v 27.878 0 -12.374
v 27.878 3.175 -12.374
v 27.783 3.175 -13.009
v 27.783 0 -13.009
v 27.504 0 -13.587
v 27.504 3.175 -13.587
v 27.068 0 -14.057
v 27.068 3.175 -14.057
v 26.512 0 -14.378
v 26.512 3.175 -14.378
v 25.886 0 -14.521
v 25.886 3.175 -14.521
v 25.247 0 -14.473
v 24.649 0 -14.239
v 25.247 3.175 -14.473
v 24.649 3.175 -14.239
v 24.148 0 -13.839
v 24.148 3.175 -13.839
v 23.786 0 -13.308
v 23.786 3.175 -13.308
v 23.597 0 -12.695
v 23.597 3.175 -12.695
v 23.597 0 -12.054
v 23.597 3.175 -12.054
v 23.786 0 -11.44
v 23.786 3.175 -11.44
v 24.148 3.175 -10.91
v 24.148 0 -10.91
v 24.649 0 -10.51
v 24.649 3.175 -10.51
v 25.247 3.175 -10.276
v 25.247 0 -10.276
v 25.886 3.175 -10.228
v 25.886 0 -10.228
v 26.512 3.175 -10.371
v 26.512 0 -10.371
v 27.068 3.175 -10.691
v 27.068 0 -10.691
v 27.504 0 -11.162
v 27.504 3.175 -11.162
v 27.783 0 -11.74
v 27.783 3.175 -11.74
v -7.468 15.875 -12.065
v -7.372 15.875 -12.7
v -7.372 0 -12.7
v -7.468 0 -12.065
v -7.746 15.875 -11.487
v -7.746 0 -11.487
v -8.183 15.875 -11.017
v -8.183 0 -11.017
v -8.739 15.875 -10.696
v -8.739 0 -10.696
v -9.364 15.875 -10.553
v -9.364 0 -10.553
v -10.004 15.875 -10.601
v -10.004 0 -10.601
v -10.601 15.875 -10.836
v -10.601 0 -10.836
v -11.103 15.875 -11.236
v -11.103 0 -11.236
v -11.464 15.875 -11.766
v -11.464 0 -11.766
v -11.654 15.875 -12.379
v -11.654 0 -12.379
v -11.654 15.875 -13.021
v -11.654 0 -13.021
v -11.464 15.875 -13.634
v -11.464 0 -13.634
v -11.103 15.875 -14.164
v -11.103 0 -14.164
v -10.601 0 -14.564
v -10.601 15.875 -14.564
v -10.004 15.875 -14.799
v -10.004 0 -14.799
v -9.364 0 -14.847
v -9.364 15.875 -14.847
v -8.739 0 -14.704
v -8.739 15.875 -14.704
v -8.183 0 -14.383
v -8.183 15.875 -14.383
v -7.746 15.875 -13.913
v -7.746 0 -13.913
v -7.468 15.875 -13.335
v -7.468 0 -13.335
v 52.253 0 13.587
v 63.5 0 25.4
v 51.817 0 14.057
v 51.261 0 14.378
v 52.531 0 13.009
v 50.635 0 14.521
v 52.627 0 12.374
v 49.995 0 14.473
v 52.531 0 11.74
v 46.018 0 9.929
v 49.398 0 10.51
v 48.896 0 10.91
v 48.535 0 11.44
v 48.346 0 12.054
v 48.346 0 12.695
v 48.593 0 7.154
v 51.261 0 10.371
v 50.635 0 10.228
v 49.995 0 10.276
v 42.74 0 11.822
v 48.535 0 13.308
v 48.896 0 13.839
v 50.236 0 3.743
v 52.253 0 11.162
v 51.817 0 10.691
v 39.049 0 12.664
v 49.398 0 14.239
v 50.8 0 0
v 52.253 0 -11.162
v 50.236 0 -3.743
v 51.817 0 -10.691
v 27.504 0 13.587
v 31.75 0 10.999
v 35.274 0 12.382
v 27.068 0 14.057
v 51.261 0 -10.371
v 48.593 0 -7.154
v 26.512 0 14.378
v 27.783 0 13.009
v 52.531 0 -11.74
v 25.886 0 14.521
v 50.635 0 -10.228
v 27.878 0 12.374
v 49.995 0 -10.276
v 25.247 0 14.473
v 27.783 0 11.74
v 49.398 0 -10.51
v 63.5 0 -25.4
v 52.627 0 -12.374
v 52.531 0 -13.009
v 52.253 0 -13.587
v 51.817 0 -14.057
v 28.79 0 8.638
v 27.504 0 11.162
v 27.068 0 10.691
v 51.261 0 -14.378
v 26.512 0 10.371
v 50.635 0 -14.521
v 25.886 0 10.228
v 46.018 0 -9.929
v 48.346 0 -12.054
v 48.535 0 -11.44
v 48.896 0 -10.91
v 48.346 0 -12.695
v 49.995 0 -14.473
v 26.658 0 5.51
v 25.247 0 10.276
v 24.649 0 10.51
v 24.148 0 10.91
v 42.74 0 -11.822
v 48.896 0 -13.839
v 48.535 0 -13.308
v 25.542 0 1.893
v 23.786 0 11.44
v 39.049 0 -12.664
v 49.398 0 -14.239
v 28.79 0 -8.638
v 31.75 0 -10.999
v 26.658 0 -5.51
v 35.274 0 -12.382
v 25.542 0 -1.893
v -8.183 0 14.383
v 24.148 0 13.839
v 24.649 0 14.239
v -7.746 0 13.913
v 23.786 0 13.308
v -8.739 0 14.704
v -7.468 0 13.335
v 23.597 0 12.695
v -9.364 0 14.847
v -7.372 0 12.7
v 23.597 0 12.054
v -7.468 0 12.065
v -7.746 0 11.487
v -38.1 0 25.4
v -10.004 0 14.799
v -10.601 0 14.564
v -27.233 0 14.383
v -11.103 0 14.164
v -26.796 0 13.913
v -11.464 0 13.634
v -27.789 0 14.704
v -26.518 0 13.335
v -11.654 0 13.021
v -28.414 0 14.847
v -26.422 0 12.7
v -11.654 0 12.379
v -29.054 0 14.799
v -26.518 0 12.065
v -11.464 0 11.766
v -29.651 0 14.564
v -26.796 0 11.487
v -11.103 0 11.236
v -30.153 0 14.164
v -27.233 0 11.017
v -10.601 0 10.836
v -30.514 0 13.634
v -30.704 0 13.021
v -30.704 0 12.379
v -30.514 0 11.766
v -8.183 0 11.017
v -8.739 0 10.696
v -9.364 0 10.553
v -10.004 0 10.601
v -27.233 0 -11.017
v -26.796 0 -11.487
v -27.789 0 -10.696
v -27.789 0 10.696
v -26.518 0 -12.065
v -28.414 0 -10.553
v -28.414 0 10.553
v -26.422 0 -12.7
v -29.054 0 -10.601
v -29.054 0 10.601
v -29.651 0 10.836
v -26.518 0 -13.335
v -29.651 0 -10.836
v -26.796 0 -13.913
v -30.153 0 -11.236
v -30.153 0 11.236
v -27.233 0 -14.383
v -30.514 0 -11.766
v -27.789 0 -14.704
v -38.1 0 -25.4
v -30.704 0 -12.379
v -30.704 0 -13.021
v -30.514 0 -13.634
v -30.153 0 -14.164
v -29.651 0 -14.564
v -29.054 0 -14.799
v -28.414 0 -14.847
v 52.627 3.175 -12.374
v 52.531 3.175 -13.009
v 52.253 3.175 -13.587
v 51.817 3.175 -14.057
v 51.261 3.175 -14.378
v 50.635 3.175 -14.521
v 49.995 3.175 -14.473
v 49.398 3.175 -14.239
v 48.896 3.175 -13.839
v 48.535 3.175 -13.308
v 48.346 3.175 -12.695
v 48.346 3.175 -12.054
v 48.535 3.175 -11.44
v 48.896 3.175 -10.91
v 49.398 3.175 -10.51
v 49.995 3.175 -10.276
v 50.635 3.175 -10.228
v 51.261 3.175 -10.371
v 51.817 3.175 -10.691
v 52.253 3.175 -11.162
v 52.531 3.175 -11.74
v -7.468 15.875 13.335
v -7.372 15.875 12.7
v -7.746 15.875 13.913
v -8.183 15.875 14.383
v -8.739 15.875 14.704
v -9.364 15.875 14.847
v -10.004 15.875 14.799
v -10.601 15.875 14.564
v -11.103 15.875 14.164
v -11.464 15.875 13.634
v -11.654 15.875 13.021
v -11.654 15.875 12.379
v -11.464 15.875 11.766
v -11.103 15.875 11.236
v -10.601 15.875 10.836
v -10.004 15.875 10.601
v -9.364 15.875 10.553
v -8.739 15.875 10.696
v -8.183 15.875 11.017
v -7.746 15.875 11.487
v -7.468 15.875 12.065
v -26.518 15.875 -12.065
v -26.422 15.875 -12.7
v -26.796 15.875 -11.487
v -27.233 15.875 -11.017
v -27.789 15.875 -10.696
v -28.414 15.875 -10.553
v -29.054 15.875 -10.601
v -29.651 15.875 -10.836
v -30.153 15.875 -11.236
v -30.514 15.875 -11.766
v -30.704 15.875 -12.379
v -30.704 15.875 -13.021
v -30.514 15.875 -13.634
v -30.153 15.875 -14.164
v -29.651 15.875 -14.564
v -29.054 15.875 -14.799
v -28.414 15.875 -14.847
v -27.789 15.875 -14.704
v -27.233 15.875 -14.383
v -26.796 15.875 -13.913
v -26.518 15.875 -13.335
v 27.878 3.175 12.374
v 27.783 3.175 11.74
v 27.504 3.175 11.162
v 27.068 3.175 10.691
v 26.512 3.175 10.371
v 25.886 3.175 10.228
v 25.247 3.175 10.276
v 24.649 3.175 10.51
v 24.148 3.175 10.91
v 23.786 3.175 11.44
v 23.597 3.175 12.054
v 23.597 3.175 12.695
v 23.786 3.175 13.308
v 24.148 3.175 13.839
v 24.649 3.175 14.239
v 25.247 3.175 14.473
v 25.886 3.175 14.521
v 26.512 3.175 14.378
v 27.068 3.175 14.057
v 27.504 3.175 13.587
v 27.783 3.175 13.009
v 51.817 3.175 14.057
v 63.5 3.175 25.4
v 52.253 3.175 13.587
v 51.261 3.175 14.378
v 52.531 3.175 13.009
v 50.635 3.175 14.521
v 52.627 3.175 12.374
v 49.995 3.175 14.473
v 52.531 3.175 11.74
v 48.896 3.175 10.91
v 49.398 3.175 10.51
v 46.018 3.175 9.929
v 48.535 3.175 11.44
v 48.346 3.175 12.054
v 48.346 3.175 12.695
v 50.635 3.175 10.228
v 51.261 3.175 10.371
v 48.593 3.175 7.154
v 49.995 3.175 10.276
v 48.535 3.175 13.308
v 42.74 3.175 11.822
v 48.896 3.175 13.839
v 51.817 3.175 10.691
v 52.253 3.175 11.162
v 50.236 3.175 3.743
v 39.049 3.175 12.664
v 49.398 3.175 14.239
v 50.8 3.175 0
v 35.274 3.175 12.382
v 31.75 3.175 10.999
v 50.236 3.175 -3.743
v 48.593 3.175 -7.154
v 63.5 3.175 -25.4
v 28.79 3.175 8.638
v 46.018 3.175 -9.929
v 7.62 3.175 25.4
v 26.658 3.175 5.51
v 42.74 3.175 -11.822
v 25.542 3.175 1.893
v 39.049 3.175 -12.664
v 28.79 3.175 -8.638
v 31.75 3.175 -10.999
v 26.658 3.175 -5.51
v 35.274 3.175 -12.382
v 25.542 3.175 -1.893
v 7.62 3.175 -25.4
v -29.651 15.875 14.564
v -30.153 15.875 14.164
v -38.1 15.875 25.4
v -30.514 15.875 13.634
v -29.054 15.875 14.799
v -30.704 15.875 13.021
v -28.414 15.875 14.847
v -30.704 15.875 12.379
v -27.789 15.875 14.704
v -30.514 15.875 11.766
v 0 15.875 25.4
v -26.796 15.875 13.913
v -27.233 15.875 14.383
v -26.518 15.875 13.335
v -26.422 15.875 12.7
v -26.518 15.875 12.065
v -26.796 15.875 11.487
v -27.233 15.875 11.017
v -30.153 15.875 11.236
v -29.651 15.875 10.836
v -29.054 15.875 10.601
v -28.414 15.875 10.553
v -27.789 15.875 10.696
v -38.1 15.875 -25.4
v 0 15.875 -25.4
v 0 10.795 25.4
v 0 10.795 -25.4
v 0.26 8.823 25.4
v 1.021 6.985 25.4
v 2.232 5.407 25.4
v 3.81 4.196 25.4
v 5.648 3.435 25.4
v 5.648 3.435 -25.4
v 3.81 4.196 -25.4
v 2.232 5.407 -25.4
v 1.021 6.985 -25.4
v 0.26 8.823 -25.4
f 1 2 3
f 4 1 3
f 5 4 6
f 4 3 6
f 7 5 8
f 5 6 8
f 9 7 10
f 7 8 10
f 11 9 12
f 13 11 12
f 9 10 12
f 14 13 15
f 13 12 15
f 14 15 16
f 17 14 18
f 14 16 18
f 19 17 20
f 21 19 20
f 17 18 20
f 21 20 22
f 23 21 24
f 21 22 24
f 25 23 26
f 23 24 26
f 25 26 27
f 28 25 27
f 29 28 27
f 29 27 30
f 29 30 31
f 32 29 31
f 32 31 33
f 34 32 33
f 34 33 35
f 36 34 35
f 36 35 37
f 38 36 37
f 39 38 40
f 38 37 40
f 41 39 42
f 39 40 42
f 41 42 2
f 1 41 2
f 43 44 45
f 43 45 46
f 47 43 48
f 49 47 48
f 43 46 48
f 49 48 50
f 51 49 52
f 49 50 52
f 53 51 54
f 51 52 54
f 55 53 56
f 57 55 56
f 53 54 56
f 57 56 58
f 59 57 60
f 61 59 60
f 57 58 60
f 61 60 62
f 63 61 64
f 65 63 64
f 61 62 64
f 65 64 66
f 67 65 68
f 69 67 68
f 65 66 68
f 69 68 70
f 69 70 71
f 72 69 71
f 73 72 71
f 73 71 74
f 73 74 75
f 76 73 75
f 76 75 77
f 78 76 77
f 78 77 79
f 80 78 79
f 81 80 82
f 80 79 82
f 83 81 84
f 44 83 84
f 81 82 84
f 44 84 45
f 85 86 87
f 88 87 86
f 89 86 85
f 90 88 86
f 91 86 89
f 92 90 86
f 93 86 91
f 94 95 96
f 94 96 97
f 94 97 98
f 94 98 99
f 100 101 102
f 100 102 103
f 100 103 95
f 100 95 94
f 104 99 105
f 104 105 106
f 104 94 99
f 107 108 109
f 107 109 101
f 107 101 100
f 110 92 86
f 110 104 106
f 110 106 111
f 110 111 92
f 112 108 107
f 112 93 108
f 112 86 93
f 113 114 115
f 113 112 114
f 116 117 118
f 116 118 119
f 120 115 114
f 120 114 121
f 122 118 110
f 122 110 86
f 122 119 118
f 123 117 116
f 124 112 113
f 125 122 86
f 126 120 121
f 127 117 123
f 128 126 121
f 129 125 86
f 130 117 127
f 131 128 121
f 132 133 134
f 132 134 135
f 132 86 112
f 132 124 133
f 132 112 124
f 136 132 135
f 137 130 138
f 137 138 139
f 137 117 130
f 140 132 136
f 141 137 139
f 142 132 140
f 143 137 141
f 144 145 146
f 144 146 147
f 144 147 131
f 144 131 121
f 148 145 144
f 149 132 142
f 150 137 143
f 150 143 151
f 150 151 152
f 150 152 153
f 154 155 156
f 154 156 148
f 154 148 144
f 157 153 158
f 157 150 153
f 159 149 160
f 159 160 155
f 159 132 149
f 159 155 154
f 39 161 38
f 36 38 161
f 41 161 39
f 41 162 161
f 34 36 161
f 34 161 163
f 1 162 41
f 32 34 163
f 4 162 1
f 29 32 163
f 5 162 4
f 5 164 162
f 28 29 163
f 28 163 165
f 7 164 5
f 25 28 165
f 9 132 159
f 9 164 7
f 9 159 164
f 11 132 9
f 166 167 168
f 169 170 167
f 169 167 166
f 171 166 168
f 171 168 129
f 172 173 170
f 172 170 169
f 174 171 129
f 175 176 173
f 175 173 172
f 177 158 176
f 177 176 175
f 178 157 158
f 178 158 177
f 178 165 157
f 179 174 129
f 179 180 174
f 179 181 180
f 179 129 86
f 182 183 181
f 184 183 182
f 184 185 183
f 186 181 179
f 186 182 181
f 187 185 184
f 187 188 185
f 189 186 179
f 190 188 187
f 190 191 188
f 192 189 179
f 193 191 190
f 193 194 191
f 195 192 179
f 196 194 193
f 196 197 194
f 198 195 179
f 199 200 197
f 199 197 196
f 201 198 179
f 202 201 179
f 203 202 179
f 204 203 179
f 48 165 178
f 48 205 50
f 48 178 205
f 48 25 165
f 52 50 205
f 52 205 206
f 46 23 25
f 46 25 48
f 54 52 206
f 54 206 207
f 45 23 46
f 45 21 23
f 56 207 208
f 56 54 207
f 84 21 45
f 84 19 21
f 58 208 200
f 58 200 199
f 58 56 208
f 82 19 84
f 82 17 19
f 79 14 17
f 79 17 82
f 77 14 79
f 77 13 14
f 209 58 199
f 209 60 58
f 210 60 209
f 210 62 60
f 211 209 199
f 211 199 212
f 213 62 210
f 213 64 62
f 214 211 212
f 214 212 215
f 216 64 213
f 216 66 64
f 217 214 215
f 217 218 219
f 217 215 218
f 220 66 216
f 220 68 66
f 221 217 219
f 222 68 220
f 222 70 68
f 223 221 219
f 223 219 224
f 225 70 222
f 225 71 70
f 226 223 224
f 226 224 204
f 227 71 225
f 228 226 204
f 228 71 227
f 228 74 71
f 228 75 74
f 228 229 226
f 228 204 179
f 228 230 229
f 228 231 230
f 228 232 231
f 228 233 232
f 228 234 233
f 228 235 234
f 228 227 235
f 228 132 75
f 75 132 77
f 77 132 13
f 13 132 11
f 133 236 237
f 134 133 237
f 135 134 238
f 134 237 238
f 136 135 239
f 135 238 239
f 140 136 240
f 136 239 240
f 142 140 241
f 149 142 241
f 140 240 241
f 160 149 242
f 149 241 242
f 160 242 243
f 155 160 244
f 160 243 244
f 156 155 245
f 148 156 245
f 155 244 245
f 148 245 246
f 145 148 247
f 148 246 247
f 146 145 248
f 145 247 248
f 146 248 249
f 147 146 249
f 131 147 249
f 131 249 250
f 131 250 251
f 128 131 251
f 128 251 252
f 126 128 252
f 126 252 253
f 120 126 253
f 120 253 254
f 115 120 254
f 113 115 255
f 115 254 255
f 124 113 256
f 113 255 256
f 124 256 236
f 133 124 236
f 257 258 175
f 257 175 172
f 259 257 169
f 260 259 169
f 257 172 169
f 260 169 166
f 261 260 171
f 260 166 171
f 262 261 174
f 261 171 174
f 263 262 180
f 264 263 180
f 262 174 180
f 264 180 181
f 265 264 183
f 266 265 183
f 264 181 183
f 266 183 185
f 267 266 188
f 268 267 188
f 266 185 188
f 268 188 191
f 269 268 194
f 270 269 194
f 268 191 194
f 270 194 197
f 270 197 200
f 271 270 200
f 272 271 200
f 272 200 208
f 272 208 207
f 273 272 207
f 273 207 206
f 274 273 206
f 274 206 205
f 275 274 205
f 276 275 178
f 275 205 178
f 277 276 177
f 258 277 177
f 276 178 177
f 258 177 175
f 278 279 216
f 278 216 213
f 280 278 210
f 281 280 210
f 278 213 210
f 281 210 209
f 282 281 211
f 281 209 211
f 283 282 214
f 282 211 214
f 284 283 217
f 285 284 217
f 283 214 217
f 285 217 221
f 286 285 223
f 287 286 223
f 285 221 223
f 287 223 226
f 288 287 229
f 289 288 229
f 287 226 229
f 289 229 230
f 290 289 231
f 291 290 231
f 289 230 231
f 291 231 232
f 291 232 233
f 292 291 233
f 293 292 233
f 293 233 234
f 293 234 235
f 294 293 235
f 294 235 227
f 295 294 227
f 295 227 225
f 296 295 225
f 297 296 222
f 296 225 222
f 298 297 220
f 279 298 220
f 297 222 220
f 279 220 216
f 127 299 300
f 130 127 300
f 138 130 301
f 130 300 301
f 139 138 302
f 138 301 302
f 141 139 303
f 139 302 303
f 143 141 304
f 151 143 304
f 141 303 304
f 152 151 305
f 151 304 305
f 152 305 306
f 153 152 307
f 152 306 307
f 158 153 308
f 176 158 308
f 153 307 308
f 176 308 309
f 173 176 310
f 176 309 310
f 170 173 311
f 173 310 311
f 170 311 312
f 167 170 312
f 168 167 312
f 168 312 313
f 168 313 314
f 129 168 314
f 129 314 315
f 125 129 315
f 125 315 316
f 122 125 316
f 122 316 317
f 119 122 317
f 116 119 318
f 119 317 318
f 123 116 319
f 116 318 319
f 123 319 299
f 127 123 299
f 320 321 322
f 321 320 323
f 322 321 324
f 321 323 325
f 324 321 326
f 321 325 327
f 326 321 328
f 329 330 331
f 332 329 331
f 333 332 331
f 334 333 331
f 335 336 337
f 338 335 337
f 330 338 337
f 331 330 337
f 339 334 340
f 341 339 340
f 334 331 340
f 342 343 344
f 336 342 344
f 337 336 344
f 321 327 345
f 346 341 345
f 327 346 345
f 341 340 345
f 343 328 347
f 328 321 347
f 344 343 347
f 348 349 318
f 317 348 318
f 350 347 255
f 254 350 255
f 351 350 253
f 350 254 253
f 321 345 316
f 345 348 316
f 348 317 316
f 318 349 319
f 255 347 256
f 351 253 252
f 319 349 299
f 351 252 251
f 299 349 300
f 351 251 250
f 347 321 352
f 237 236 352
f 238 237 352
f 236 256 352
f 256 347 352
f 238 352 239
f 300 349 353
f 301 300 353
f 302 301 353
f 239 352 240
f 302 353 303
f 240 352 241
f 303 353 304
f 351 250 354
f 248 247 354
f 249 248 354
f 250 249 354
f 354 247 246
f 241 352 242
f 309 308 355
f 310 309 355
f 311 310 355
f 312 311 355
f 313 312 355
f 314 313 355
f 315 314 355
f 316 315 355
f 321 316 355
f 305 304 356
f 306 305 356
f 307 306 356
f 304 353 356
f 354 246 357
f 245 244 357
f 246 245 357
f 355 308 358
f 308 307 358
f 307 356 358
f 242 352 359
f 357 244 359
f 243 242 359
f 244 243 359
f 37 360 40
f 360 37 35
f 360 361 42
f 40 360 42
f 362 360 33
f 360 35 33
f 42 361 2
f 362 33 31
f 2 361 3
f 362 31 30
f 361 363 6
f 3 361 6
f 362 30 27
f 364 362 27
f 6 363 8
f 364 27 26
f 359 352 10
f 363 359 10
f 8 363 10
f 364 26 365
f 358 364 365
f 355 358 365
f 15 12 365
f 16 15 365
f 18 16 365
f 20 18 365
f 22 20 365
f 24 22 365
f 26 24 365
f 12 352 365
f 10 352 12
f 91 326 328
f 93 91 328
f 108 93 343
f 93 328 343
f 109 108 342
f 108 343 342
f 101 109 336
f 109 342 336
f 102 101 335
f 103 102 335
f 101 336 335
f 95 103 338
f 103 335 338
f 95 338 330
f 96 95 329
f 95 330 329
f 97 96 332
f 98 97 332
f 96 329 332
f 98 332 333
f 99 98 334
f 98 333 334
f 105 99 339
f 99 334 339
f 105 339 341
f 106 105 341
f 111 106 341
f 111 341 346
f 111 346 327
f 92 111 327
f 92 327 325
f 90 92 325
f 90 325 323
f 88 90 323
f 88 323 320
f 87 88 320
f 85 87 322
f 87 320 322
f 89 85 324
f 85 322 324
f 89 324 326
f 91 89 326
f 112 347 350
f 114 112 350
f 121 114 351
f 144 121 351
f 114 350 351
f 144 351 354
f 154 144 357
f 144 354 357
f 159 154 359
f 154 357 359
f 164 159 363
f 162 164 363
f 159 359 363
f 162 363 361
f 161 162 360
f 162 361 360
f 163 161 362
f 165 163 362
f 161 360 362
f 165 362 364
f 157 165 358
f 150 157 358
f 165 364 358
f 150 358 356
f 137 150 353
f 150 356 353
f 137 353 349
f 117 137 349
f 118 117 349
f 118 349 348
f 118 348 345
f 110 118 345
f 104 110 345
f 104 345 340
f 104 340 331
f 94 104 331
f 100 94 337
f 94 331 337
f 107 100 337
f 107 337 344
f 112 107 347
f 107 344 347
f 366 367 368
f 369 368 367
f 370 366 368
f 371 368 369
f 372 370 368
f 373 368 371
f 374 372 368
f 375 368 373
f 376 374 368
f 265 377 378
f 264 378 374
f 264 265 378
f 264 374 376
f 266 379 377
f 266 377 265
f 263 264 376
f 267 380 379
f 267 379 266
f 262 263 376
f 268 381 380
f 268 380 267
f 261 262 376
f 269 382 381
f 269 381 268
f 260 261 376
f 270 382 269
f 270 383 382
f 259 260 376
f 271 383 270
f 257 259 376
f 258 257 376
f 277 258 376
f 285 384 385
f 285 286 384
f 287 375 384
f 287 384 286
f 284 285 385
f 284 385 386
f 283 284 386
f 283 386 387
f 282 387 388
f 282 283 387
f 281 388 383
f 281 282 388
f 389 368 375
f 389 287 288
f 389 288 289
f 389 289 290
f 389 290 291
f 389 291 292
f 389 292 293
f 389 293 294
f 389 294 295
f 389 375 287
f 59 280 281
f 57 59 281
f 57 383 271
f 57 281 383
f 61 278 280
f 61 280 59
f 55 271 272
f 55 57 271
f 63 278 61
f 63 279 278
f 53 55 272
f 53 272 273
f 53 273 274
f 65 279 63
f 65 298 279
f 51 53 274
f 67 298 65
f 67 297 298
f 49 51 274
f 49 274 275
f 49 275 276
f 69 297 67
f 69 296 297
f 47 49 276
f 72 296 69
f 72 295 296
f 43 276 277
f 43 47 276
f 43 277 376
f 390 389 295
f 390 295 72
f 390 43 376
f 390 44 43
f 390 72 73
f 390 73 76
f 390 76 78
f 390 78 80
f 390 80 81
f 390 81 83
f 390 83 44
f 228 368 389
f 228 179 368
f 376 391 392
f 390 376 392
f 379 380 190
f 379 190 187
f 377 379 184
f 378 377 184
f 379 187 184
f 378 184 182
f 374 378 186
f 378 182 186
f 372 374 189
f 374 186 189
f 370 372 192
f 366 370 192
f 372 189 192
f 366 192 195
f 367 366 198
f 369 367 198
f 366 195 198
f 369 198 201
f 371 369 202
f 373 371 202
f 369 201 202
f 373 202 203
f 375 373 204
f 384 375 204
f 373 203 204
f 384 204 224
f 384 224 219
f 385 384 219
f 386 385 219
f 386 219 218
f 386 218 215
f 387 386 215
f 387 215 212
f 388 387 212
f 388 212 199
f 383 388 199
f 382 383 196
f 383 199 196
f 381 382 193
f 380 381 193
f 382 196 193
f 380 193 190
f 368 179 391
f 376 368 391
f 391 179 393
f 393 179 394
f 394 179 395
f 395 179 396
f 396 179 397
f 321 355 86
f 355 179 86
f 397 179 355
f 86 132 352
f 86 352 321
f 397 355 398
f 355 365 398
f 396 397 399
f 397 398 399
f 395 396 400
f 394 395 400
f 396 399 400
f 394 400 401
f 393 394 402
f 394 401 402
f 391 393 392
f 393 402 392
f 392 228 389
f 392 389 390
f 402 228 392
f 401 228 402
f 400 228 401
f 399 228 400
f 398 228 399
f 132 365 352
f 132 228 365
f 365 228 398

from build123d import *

# Parameters (mm, degrees)
BOSS_EXTRUDE1_DEPTH          = 3.175
SKETCH6_W                    = 38.1
SKETCH6_H                    = 50.8
BOSS_EXTRUDE3_DEPTH          = 12.7
FILLET1_R                    = 7.62
SKETCH2_R                    = 2.15265
MOUNTINGHOLESM4_DEPTH        = 3.175
SKETCH5_R                    = 12.7
HOLEFOR25MMOUTCROPPING_DEPTH = 3.175
SKETCH7_R                    = 2.15265
CUT_EXTRUDE4_DEPTH           = 15.875


with BuildPart() as part:
    # Sketch1 → Boss-Extrude1 (new body)
    with BuildSketch(Plane(origin=(0, 0, 0), x_dir=(1, 0, 0), z_dir=(0, 1, 0))):
        Polygon((50.8, 25.4), (63.5, 25.4), (63.5, -25.4), (50.8, -25.4), (0, -25.4), (-38.1, -25.4), (-38.1, 25.4), (0, 25.4), align=None)
    extrude(amount=BOSS_EXTRUDE1_DEPTH)

    # Sketch6 → Boss-Extrude3 (add)
    with BuildSketch(Plane(origin=(0, 3.175, 0), x_dir=(1, 0, 0), z_dir=(0, 1, 0))):
        with Locations((-19.05, 0)):
            Rectangle(SKETCH6_W, SKETCH6_H)
    extrude(amount=BOSS_EXTRUDE3_DEPTH)

    # Fillet1
    fillet1_edges = [part.edges().sort_by_distance(p)[0] for p in [
        (0, 3.175, 0),
    ]]
    fillet(fillet1_edges, radius=FILLET1_R)

    # Sketch2 → MountingHolesM4 (cut)
    with BuildSketch(Plane(origin=(0, 3.175, 0), x_dir=(1, 0, 0), z_dir=(0, 1, 0))):
        with Locations((50.474368671, 12.374368671)):
            Circle(SKETCH2_R)
        with Locations((50.474368671, -12.374368671)):
            Circle(SKETCH2_R)
        with Locations((25.725631329, -12.374368671)):
            Circle(SKETCH2_R)
        with Locations((25.725631329, 12.374368671)):
            Circle(SKETCH2_R)
    extrude(amount=-MOUNTINGHOLESM4_DEPTH, mode=Mode.SUBTRACT)

    # Sketch5 → HoleFor25mmOutCropping (cut)
    with BuildSketch(Plane(origin=(0, 3.175, 0), x_dir=(1, 0, 0), z_dir=(0, 1, 0))):
        with Locations((38.1, 0)):
            Circle(SKETCH5_R)
    extrude(amount=-HOLEFOR25MMOUTCROPPING_DEPTH, mode=Mode.SUBTRACT)

    # Sketch7 → Cut-Extrude4 (cut)
    with BuildSketch(Plane.XZ):
        with Locations((-9.525, -12.7)):
            Circle(SKETCH7_R)
        with Locations((-28.575, -12.7)):
            Circle(SKETCH7_R)
        with Locations((-9.525, 12.7)):
            Circle(SKETCH7_R)
        with Locations((-28.575, 12.7)):
            Circle(SKETCH7_R)
    extrude(amount=-CUT_EXTRUDE4_DEPTH, mode=Mode.SUBTRACT)


solid = part.part
